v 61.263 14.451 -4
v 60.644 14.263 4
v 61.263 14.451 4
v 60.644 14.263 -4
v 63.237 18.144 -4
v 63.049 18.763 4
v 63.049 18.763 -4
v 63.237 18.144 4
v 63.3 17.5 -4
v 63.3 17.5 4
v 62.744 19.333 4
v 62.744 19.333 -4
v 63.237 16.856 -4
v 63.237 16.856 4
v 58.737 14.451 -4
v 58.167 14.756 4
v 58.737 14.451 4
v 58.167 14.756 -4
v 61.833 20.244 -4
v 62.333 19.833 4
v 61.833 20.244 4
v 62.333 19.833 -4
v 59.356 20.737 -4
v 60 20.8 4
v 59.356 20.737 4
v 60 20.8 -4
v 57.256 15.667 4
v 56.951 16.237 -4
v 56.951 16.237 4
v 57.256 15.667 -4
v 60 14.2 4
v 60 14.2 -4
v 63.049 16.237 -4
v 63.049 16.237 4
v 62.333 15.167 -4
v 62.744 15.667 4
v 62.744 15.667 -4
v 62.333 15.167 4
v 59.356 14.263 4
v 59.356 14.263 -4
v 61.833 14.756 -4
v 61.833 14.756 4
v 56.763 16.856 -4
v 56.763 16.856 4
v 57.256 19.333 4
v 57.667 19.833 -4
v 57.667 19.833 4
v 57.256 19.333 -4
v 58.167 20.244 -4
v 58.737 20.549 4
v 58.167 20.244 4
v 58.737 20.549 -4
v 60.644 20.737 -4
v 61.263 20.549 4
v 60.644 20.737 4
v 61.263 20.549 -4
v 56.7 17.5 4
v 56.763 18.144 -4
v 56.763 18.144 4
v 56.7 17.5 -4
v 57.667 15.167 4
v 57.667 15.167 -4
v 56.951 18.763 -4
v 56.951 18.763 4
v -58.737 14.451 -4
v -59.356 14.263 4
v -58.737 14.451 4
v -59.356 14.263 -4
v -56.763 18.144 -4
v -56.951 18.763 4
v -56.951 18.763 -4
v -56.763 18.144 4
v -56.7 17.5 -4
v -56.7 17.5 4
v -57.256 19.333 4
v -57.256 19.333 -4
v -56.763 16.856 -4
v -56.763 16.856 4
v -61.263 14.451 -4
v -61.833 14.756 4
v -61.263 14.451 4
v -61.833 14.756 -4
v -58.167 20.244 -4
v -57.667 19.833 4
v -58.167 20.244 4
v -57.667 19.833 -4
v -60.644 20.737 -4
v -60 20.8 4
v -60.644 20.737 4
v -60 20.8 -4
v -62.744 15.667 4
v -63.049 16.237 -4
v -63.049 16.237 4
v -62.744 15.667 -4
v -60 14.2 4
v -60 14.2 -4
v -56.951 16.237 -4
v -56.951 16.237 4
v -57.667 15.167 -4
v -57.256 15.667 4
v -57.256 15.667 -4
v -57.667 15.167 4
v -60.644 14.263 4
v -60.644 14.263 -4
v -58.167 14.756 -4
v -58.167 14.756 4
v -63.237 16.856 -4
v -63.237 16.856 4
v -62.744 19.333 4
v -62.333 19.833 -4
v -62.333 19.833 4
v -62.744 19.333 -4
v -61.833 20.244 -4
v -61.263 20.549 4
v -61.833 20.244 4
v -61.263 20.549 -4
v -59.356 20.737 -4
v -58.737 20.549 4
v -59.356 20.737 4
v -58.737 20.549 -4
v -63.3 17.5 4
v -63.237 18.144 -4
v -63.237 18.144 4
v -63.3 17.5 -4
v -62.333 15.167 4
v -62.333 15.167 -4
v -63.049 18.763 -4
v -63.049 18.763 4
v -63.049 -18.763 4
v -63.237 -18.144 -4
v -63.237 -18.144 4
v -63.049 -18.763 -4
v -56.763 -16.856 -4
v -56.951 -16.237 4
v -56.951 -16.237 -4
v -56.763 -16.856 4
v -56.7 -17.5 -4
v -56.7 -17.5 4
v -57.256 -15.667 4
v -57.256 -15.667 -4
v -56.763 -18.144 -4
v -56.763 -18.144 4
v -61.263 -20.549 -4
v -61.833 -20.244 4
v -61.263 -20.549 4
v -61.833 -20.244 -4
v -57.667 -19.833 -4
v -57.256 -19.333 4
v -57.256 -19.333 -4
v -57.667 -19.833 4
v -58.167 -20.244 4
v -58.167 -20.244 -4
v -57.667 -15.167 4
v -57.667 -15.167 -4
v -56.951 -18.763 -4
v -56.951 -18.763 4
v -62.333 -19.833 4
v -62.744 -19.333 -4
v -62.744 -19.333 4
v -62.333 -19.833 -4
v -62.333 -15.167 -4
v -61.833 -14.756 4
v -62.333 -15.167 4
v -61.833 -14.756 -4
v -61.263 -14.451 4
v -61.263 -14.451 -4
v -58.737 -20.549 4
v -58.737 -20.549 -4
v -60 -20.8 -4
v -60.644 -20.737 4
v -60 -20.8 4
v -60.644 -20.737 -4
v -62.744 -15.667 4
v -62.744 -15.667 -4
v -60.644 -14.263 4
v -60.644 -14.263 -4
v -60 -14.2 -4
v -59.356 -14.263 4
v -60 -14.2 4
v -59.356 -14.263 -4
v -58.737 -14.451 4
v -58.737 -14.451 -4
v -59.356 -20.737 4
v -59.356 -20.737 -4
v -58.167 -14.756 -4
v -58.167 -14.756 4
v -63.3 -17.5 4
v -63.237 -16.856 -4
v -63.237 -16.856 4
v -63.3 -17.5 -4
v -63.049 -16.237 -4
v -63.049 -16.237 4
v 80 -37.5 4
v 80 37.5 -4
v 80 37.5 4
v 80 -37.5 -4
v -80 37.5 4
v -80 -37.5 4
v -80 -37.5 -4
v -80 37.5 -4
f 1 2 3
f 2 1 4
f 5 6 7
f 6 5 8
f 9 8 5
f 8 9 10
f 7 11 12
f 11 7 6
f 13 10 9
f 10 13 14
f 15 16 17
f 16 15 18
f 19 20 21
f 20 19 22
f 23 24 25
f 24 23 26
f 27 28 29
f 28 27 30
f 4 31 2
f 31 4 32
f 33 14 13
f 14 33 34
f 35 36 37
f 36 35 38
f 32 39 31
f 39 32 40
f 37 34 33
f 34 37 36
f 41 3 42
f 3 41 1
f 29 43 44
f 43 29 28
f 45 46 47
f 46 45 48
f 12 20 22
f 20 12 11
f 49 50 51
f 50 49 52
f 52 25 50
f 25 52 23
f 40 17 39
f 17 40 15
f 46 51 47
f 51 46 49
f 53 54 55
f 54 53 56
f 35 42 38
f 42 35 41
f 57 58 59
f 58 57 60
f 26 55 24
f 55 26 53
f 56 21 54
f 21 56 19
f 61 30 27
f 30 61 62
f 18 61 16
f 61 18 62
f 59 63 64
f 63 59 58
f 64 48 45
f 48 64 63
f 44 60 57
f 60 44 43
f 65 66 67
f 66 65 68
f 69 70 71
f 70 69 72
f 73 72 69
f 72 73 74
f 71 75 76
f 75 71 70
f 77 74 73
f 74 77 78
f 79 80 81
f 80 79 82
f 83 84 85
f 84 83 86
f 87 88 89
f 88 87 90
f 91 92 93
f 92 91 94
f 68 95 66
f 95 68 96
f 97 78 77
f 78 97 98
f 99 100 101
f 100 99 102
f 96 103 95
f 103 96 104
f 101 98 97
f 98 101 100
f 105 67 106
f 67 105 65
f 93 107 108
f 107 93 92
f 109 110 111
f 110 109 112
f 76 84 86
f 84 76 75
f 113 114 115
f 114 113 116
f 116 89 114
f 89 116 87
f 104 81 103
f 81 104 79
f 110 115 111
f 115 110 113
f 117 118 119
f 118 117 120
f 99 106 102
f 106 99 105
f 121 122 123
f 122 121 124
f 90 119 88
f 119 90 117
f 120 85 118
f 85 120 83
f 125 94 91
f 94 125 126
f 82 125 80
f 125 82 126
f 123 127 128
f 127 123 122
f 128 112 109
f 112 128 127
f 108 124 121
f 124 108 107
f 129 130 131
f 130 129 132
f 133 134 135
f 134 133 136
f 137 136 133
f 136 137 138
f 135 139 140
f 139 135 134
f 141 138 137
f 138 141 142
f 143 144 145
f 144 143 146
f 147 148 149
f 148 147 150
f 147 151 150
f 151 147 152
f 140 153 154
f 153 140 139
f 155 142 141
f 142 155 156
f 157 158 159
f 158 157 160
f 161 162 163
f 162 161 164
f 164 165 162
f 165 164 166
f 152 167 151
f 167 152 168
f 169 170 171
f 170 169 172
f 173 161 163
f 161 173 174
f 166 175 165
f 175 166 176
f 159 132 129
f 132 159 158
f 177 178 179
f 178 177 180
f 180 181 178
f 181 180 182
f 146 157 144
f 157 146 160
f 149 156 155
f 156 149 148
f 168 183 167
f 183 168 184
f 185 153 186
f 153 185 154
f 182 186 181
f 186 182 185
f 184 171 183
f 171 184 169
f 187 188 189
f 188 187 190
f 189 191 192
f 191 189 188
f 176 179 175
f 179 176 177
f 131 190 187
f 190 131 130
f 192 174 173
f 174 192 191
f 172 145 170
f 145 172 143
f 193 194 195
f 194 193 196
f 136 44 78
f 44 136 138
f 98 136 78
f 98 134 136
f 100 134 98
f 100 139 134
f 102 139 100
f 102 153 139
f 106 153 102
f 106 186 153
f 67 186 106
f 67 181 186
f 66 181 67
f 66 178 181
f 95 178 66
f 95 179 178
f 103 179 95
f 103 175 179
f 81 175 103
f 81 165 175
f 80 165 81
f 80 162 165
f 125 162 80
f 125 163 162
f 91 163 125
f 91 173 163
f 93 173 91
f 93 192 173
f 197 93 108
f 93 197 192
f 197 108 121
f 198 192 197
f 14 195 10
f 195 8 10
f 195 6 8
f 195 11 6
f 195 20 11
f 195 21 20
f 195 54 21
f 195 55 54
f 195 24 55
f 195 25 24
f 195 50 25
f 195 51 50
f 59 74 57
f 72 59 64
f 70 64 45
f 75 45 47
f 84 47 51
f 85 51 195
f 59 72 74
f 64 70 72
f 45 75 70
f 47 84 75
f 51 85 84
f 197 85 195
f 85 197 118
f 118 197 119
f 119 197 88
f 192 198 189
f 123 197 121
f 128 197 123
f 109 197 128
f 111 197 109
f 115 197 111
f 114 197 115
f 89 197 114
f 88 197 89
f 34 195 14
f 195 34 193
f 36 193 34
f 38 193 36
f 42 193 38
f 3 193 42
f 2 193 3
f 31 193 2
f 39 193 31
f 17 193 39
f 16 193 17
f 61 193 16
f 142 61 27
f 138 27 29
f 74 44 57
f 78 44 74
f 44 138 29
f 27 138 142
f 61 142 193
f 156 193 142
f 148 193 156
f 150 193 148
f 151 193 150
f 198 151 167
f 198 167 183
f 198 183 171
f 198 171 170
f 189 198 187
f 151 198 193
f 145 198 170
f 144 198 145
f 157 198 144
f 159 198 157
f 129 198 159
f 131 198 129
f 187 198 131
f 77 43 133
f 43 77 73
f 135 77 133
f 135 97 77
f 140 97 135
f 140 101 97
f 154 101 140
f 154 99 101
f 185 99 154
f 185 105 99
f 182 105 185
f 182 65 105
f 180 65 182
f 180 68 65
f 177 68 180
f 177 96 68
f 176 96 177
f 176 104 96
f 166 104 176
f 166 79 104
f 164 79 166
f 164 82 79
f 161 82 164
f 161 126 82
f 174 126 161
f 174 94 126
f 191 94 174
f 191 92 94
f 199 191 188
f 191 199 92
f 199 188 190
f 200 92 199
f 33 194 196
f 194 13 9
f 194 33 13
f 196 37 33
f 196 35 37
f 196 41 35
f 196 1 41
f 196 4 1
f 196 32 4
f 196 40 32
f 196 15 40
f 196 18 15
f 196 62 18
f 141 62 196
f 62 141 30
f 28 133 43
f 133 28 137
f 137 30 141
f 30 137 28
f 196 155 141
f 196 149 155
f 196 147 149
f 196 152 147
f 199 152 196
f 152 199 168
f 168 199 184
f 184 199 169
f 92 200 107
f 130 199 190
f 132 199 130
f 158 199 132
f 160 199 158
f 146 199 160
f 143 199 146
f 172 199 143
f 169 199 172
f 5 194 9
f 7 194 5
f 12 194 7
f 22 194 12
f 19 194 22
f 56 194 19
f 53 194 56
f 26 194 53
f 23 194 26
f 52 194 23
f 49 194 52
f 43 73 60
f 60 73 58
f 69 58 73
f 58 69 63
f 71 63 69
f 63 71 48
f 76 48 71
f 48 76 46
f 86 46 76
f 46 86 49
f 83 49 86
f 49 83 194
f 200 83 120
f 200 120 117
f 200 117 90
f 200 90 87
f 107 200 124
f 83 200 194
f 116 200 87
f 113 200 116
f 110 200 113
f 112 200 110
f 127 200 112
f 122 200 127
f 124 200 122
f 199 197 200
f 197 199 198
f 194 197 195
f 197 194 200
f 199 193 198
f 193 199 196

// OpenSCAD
$fn = 32;

// ----------------------------------------------------------------------
// Corner plate 160 x 75 x 8
// 3 holes, centres taken from the edge offset
// ----------------------------------------------------------------------

// --- parameters (mm) ---
plate = [160, 75, 8];  // overall size (x, y, z)
holes = 3;             // number of holes the drawing asks for
hole_d = 6.6;          // hole diameter
edge = 20;             // hole centre offset from the plate edge

// --- derived feature positions (mm) ---
corner_x = plate[0] / 2 - edge;  // = 60   corner hole X
corner_y = plate[1] / 2 - edge;  // = 17.5   corner hole Y
feature_centers = [
  [corner_x, corner_y],
  [-corner_x, corner_y],
  [-corner_x, -corner_y]
];   // hole centres the loop below drills

// plate outline, every hole drilled through with the same cutters
difference() {
  cube(plate, center = true);
  for (centre = feature_centers)
    translate([centre[0], centre[1], 0])
      cylinder(d = hole_d, h = plate[2] + 2, center = true);
}
